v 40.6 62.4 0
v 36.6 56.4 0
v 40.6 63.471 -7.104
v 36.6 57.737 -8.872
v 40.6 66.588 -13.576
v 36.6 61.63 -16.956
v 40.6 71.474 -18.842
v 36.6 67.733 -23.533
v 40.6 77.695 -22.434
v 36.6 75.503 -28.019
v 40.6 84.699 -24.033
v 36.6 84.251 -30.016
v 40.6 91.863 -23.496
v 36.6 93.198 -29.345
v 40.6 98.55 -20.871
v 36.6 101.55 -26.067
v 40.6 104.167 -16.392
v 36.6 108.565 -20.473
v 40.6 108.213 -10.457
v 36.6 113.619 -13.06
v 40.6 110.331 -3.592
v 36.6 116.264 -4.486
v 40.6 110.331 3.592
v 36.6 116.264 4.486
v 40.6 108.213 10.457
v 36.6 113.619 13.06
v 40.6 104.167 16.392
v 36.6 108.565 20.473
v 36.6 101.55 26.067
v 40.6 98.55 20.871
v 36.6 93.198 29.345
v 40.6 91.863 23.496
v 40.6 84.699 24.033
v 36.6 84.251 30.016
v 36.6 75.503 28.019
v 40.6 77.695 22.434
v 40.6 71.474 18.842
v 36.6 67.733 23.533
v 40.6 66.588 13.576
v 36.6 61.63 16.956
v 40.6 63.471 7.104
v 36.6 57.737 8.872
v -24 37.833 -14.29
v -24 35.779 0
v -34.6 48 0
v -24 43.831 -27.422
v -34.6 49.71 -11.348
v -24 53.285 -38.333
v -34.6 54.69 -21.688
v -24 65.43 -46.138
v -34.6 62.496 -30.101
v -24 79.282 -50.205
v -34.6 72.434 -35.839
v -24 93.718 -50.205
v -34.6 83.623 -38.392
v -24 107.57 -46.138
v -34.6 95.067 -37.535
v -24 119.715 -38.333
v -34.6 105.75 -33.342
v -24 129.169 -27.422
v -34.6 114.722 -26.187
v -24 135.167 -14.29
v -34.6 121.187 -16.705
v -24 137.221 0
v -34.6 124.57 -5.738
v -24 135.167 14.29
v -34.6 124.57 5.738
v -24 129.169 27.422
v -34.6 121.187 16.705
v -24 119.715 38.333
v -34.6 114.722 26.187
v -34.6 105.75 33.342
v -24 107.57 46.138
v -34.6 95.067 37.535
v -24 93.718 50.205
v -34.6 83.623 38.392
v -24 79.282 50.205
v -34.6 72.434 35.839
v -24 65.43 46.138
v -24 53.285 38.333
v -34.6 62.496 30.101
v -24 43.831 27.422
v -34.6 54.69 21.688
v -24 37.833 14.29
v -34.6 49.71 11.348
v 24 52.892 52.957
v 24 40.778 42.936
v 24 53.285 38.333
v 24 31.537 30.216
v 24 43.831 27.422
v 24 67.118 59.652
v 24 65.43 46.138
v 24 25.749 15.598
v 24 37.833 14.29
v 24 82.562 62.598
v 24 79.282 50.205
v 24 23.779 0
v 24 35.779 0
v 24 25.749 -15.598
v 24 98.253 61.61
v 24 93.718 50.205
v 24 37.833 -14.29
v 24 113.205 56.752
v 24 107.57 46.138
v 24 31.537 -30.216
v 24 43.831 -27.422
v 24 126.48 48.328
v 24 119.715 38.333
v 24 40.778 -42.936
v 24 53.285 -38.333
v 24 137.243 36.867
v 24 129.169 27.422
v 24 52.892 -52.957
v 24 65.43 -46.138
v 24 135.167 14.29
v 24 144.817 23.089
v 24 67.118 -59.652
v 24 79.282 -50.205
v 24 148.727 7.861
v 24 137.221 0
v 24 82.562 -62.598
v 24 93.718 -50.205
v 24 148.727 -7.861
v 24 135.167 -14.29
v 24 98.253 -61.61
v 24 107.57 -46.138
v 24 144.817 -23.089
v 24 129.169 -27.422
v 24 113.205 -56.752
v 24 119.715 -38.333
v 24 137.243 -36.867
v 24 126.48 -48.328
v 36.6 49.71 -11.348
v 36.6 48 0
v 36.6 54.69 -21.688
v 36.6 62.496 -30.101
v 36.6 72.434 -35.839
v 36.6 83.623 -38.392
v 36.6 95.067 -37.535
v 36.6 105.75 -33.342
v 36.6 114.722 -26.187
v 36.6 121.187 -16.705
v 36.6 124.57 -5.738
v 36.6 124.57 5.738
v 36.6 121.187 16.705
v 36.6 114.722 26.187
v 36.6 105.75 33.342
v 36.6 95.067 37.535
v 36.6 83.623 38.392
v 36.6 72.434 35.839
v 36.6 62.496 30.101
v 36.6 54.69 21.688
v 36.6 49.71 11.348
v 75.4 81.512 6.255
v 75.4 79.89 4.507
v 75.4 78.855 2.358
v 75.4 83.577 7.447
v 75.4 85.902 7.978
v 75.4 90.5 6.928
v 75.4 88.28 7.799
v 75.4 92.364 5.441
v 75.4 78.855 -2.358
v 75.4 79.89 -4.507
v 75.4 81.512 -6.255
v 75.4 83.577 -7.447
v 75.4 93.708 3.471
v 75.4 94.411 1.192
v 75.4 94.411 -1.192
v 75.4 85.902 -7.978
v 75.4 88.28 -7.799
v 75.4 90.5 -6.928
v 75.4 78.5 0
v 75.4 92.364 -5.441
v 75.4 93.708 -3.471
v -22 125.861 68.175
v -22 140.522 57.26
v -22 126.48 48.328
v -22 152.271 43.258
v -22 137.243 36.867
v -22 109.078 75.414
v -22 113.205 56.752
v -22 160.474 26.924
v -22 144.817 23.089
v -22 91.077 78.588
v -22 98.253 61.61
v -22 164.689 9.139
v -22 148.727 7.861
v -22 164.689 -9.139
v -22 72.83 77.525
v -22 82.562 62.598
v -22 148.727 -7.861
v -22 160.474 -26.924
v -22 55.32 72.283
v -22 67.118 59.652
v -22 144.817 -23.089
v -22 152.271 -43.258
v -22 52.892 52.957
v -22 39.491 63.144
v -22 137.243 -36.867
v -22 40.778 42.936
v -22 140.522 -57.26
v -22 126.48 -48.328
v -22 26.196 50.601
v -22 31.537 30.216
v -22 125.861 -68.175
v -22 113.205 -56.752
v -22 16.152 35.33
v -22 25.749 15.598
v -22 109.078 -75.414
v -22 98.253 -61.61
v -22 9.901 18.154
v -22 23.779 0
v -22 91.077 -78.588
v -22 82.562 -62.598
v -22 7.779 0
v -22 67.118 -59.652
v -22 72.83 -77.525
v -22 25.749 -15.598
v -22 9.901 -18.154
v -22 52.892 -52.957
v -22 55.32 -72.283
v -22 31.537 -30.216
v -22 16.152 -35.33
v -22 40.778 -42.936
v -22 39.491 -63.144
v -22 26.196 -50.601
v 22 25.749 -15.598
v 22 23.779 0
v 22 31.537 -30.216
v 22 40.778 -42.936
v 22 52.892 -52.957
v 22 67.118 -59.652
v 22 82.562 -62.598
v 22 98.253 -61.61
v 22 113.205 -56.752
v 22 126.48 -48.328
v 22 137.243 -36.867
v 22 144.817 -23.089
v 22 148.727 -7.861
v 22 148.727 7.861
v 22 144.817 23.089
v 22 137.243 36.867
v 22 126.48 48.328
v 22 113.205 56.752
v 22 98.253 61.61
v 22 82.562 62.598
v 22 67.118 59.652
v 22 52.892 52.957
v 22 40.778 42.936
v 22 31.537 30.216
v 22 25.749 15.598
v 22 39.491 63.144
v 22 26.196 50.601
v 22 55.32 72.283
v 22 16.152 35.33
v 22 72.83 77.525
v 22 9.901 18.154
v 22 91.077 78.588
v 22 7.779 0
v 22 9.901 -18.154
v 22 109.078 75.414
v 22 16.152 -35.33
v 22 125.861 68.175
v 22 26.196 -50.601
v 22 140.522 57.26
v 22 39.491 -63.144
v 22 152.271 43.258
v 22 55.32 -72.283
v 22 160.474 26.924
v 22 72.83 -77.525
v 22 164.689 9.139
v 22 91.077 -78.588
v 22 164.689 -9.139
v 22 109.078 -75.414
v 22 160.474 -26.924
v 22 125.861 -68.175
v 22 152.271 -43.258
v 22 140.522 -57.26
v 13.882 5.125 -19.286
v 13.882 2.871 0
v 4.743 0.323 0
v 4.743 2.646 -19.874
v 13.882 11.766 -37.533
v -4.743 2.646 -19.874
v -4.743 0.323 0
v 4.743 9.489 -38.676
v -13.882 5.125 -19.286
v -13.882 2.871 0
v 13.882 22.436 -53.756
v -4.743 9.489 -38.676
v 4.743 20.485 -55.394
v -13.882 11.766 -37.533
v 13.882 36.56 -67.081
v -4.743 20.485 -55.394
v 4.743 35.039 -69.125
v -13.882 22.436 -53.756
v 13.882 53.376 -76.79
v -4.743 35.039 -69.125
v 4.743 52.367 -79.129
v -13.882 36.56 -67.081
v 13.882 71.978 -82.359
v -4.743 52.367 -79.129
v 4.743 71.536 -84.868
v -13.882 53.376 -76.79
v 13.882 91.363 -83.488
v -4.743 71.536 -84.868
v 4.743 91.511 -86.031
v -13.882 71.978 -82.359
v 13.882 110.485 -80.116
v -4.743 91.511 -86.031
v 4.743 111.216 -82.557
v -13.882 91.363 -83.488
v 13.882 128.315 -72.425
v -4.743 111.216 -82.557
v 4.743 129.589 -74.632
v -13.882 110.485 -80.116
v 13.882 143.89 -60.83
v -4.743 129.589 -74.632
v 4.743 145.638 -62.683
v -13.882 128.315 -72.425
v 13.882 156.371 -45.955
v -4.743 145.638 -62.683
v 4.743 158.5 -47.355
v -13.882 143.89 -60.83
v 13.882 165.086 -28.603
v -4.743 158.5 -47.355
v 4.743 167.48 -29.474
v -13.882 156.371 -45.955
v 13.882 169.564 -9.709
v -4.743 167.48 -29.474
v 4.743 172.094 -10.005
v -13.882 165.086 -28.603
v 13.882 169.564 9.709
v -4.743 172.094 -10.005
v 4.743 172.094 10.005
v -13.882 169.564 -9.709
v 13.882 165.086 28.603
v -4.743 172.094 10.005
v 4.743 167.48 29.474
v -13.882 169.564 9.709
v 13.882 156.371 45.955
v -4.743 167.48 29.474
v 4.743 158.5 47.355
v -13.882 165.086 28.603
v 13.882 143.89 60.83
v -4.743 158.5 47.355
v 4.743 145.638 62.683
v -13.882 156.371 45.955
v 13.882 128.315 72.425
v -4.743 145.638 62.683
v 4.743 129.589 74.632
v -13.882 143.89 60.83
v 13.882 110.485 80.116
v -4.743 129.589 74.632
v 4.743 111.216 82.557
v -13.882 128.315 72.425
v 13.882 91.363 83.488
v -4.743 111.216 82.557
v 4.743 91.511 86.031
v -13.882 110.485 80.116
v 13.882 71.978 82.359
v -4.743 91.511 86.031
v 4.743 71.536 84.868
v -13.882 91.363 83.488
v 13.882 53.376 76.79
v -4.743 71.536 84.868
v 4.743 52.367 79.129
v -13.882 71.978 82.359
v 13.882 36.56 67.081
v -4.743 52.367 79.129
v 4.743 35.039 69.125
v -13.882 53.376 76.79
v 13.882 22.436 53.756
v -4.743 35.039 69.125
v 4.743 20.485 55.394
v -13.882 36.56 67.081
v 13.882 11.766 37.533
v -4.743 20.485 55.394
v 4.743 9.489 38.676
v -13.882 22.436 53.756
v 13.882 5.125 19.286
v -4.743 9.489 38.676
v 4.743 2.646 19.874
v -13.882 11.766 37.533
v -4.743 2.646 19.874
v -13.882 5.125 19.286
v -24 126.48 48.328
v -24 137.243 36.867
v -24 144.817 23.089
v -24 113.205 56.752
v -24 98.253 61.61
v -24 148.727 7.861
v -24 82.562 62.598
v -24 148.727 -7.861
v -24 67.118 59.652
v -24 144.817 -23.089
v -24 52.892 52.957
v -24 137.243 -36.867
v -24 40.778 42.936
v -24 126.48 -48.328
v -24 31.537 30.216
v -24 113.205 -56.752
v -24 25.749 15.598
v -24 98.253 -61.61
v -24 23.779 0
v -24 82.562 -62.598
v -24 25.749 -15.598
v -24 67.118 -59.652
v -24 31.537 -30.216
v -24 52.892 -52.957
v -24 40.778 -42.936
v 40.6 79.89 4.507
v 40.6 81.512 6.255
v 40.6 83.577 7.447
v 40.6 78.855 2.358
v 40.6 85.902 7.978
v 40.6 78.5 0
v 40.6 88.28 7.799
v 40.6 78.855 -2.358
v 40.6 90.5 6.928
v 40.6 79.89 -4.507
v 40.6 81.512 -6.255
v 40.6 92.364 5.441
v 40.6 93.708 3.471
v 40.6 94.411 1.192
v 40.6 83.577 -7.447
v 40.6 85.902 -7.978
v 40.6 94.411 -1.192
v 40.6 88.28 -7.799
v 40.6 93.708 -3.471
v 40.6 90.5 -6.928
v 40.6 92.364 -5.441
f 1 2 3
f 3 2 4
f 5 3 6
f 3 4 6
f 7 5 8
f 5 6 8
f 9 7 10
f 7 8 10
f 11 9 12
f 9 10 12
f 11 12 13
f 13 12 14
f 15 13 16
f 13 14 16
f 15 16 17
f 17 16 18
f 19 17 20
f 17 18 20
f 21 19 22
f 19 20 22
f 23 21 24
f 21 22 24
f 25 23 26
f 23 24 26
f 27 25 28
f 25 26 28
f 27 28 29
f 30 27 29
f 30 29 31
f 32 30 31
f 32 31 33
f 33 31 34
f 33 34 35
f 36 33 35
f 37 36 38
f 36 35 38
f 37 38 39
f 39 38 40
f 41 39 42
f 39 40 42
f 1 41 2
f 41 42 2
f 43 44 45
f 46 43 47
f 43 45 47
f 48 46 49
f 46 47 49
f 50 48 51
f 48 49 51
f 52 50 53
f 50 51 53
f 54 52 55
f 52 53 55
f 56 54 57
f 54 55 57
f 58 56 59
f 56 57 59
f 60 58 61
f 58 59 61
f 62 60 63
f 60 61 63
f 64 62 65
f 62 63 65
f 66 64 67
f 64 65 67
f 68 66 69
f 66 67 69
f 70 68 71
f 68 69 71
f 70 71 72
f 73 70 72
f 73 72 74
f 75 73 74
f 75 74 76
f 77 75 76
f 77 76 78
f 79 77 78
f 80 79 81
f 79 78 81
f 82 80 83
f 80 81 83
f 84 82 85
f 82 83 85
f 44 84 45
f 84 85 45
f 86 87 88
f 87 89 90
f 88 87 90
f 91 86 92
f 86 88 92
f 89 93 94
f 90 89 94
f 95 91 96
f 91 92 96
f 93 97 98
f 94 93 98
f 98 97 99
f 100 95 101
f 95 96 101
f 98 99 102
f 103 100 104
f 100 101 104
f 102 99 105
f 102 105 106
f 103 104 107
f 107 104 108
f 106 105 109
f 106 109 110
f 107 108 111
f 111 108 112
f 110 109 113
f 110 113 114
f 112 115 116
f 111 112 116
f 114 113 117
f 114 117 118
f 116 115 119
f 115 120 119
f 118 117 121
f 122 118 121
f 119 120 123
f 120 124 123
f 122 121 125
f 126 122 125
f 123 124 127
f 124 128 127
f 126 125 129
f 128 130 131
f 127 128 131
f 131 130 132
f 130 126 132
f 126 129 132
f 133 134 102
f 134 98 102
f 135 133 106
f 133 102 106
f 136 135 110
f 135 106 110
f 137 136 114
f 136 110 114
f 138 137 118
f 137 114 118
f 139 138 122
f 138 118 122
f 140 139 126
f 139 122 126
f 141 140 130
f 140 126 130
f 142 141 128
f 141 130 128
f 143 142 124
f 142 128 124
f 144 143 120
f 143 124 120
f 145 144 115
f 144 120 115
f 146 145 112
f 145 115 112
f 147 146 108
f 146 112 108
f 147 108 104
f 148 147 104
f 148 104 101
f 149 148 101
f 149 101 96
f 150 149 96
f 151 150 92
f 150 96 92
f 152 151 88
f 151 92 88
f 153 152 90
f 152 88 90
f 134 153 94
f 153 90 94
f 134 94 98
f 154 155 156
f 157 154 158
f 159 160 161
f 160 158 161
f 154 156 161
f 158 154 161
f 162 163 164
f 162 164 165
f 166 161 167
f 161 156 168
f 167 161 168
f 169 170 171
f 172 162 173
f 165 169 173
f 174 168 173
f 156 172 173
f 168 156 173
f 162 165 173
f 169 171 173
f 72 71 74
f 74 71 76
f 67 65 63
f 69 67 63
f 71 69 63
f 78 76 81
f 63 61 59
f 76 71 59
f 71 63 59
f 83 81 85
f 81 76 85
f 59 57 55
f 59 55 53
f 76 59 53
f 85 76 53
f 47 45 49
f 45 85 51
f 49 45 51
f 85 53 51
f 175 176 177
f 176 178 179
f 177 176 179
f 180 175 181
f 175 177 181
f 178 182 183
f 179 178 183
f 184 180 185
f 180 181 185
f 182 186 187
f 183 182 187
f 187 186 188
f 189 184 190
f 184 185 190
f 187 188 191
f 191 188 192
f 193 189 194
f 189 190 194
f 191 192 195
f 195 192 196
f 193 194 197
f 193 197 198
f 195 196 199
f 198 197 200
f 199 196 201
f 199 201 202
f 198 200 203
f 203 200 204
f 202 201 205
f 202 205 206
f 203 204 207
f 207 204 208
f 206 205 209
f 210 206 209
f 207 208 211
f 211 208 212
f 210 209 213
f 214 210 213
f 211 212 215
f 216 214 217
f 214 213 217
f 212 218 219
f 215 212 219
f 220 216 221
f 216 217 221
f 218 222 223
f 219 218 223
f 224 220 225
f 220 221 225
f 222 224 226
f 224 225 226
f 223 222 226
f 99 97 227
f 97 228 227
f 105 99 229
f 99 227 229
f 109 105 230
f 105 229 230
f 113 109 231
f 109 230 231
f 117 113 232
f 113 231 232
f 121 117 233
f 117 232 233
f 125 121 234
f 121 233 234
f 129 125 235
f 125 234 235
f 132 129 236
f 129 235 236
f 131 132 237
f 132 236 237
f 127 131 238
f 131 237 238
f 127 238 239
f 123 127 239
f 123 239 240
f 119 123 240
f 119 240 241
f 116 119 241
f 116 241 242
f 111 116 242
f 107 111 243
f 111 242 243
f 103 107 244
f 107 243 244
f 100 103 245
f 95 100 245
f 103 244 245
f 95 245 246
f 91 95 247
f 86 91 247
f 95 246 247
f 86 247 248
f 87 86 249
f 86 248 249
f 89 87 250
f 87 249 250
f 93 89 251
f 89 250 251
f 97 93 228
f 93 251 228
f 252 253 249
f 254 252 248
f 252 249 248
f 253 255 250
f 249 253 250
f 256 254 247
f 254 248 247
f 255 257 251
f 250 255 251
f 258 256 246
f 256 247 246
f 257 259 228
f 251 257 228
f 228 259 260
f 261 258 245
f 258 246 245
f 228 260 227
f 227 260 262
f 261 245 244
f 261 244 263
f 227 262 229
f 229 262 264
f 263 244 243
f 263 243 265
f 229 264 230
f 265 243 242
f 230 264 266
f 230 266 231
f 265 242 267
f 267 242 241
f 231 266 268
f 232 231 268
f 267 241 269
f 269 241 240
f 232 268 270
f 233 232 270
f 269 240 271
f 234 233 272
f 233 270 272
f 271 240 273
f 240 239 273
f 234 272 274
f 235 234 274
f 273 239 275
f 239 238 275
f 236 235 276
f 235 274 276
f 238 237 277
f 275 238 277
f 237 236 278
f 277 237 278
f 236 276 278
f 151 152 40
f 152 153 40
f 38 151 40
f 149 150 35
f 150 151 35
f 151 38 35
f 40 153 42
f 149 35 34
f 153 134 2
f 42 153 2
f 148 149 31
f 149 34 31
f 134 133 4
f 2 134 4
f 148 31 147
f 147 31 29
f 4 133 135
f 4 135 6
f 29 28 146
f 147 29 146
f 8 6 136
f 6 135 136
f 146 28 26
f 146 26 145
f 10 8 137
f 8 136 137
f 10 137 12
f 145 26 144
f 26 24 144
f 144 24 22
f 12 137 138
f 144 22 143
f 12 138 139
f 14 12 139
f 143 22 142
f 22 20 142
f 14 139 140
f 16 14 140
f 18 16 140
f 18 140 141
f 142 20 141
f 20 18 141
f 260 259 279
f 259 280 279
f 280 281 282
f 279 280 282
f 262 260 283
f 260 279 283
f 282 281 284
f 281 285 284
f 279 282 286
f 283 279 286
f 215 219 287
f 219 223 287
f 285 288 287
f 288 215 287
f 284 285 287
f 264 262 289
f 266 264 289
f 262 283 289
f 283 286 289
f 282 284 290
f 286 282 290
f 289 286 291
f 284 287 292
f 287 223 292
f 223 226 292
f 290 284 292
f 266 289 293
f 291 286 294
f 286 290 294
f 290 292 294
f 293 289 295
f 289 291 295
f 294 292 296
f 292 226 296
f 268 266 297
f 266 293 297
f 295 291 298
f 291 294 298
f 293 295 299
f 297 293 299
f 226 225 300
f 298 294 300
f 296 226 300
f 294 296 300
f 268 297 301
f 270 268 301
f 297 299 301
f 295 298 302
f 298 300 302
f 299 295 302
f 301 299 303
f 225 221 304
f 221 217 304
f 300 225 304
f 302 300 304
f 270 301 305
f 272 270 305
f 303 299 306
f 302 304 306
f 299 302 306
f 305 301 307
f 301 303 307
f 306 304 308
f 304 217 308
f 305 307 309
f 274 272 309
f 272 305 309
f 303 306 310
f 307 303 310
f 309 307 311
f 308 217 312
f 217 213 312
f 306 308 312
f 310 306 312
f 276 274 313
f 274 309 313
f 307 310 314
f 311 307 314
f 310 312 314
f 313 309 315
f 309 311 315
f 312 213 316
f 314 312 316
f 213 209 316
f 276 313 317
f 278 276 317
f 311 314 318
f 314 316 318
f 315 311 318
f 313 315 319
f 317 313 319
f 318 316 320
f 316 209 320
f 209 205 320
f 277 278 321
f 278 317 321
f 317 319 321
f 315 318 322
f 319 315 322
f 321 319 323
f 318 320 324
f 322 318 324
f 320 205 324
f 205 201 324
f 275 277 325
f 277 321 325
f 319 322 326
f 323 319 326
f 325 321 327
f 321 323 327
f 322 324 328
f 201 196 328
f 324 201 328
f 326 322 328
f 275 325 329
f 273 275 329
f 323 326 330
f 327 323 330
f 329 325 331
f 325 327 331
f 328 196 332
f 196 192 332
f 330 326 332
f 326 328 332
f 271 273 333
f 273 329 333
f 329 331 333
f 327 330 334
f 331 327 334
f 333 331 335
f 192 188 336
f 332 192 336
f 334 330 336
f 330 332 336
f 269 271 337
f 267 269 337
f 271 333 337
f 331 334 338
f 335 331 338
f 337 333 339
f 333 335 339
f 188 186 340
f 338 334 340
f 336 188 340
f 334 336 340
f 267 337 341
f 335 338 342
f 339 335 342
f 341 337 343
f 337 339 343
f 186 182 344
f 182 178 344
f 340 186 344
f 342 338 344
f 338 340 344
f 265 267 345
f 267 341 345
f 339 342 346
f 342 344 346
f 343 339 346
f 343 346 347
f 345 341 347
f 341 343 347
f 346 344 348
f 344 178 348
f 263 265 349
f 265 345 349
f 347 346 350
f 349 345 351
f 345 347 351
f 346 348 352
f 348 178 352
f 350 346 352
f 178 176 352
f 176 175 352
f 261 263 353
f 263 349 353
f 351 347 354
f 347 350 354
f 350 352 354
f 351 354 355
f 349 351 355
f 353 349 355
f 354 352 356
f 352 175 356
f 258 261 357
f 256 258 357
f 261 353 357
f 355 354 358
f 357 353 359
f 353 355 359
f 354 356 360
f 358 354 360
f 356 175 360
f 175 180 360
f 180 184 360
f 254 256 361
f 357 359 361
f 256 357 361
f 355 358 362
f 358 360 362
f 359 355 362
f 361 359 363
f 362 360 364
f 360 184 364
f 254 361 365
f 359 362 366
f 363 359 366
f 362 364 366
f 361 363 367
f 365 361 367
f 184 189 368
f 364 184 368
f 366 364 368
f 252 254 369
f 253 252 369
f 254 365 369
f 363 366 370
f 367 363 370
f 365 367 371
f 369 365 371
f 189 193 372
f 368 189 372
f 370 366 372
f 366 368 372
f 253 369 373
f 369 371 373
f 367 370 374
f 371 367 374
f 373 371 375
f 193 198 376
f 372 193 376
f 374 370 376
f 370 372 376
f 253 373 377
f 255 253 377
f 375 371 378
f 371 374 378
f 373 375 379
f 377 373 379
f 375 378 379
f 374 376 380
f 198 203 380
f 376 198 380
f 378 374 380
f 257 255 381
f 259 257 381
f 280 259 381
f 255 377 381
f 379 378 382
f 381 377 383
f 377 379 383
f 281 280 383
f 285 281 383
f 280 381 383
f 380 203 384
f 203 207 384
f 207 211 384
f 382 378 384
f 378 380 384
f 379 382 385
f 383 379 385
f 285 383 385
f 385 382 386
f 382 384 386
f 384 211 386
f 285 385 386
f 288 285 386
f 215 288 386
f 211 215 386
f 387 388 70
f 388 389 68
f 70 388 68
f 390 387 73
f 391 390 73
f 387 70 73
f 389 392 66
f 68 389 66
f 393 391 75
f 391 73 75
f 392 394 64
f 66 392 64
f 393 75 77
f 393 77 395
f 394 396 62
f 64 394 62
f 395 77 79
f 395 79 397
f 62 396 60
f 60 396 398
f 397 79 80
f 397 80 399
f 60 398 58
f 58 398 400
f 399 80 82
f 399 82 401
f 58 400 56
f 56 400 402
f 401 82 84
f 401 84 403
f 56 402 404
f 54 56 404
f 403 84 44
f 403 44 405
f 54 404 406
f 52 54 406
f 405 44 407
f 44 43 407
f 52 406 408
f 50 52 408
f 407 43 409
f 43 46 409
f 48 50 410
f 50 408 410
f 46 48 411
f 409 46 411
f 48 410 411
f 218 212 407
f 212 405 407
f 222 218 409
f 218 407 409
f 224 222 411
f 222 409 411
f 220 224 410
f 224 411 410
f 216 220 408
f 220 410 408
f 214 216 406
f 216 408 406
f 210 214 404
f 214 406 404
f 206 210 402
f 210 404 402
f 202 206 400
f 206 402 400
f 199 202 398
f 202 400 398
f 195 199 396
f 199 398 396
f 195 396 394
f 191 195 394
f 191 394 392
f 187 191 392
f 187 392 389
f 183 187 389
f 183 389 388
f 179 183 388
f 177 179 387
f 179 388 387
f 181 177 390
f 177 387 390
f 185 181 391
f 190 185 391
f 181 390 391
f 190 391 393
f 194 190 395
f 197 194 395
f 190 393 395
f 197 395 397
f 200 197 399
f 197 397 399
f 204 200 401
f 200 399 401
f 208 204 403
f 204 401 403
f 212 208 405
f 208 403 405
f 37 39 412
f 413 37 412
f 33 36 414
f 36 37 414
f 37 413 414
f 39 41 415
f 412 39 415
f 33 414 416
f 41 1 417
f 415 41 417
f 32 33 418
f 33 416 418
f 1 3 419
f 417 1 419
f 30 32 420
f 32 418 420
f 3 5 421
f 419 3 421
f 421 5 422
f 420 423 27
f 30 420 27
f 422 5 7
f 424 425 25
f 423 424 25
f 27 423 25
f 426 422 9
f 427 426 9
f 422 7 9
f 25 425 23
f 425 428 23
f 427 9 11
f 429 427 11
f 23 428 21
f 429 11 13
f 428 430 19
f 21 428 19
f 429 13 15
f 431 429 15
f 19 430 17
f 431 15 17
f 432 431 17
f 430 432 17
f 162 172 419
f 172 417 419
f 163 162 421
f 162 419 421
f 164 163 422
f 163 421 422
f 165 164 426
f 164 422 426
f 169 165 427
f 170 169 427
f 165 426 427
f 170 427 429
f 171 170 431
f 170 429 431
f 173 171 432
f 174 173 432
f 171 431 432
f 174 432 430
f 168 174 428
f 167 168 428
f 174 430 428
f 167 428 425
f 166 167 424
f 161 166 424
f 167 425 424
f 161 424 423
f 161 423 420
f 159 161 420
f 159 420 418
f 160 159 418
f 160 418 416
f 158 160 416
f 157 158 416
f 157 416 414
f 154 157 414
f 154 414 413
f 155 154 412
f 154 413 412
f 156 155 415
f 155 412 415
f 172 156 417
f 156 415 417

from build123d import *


with BuildPart() as part:
    # Croquis1 → Revolución1 (revolve)
    with BuildSketch(Plane.XY, mode=Mode.PRIVATE) as revoluci_n1_sk:
        with BuildLine():
            Line((-22, 165.221315178), (-22, 149.221315178))
            Line((-22, 149.221315178), (-24, 149.221315178))
            Line((-24, 149.221315178), (-24, 137.221315178))
            Line((-24, 137.221315178), (-34.6, 125))
            Line((-34.6, 125), (-34.6, 86.5))
            Line((-34.6, 86.5), (75.4, 86.5))
            Line((75.4, 86.5), (75.4, 94.5))
            Line((75.4, 94.5), (40.6, 94.5))
            Line((40.6, 94.5), (40.6, 110.6))
            Line((40.6, 110.6), (36.6, 116.6))
            Line((36.6, 116.6), (36.6, 125))
            Line((36.6, 125), (24, 137.221315178))
            Line((24, 137.221315178), (24, 149.221315178))
            Line((24, 149.221315178), (22, 149.221315178))
            Line((22, 149.221315178), (22, 165.221315178))
            ThreePointArc((22, 165.221315178), (0, 173), (-22, 165.221315178))
        make_face()
    revolve(revoluci_n1_sk.sketch.rotate(Axis((-34.6, 86.5, 0), (1, 0, 0)), 180), axis=Axis((-34.6, 86.5, 0), (1, 0, 0)))


solid = part.part
